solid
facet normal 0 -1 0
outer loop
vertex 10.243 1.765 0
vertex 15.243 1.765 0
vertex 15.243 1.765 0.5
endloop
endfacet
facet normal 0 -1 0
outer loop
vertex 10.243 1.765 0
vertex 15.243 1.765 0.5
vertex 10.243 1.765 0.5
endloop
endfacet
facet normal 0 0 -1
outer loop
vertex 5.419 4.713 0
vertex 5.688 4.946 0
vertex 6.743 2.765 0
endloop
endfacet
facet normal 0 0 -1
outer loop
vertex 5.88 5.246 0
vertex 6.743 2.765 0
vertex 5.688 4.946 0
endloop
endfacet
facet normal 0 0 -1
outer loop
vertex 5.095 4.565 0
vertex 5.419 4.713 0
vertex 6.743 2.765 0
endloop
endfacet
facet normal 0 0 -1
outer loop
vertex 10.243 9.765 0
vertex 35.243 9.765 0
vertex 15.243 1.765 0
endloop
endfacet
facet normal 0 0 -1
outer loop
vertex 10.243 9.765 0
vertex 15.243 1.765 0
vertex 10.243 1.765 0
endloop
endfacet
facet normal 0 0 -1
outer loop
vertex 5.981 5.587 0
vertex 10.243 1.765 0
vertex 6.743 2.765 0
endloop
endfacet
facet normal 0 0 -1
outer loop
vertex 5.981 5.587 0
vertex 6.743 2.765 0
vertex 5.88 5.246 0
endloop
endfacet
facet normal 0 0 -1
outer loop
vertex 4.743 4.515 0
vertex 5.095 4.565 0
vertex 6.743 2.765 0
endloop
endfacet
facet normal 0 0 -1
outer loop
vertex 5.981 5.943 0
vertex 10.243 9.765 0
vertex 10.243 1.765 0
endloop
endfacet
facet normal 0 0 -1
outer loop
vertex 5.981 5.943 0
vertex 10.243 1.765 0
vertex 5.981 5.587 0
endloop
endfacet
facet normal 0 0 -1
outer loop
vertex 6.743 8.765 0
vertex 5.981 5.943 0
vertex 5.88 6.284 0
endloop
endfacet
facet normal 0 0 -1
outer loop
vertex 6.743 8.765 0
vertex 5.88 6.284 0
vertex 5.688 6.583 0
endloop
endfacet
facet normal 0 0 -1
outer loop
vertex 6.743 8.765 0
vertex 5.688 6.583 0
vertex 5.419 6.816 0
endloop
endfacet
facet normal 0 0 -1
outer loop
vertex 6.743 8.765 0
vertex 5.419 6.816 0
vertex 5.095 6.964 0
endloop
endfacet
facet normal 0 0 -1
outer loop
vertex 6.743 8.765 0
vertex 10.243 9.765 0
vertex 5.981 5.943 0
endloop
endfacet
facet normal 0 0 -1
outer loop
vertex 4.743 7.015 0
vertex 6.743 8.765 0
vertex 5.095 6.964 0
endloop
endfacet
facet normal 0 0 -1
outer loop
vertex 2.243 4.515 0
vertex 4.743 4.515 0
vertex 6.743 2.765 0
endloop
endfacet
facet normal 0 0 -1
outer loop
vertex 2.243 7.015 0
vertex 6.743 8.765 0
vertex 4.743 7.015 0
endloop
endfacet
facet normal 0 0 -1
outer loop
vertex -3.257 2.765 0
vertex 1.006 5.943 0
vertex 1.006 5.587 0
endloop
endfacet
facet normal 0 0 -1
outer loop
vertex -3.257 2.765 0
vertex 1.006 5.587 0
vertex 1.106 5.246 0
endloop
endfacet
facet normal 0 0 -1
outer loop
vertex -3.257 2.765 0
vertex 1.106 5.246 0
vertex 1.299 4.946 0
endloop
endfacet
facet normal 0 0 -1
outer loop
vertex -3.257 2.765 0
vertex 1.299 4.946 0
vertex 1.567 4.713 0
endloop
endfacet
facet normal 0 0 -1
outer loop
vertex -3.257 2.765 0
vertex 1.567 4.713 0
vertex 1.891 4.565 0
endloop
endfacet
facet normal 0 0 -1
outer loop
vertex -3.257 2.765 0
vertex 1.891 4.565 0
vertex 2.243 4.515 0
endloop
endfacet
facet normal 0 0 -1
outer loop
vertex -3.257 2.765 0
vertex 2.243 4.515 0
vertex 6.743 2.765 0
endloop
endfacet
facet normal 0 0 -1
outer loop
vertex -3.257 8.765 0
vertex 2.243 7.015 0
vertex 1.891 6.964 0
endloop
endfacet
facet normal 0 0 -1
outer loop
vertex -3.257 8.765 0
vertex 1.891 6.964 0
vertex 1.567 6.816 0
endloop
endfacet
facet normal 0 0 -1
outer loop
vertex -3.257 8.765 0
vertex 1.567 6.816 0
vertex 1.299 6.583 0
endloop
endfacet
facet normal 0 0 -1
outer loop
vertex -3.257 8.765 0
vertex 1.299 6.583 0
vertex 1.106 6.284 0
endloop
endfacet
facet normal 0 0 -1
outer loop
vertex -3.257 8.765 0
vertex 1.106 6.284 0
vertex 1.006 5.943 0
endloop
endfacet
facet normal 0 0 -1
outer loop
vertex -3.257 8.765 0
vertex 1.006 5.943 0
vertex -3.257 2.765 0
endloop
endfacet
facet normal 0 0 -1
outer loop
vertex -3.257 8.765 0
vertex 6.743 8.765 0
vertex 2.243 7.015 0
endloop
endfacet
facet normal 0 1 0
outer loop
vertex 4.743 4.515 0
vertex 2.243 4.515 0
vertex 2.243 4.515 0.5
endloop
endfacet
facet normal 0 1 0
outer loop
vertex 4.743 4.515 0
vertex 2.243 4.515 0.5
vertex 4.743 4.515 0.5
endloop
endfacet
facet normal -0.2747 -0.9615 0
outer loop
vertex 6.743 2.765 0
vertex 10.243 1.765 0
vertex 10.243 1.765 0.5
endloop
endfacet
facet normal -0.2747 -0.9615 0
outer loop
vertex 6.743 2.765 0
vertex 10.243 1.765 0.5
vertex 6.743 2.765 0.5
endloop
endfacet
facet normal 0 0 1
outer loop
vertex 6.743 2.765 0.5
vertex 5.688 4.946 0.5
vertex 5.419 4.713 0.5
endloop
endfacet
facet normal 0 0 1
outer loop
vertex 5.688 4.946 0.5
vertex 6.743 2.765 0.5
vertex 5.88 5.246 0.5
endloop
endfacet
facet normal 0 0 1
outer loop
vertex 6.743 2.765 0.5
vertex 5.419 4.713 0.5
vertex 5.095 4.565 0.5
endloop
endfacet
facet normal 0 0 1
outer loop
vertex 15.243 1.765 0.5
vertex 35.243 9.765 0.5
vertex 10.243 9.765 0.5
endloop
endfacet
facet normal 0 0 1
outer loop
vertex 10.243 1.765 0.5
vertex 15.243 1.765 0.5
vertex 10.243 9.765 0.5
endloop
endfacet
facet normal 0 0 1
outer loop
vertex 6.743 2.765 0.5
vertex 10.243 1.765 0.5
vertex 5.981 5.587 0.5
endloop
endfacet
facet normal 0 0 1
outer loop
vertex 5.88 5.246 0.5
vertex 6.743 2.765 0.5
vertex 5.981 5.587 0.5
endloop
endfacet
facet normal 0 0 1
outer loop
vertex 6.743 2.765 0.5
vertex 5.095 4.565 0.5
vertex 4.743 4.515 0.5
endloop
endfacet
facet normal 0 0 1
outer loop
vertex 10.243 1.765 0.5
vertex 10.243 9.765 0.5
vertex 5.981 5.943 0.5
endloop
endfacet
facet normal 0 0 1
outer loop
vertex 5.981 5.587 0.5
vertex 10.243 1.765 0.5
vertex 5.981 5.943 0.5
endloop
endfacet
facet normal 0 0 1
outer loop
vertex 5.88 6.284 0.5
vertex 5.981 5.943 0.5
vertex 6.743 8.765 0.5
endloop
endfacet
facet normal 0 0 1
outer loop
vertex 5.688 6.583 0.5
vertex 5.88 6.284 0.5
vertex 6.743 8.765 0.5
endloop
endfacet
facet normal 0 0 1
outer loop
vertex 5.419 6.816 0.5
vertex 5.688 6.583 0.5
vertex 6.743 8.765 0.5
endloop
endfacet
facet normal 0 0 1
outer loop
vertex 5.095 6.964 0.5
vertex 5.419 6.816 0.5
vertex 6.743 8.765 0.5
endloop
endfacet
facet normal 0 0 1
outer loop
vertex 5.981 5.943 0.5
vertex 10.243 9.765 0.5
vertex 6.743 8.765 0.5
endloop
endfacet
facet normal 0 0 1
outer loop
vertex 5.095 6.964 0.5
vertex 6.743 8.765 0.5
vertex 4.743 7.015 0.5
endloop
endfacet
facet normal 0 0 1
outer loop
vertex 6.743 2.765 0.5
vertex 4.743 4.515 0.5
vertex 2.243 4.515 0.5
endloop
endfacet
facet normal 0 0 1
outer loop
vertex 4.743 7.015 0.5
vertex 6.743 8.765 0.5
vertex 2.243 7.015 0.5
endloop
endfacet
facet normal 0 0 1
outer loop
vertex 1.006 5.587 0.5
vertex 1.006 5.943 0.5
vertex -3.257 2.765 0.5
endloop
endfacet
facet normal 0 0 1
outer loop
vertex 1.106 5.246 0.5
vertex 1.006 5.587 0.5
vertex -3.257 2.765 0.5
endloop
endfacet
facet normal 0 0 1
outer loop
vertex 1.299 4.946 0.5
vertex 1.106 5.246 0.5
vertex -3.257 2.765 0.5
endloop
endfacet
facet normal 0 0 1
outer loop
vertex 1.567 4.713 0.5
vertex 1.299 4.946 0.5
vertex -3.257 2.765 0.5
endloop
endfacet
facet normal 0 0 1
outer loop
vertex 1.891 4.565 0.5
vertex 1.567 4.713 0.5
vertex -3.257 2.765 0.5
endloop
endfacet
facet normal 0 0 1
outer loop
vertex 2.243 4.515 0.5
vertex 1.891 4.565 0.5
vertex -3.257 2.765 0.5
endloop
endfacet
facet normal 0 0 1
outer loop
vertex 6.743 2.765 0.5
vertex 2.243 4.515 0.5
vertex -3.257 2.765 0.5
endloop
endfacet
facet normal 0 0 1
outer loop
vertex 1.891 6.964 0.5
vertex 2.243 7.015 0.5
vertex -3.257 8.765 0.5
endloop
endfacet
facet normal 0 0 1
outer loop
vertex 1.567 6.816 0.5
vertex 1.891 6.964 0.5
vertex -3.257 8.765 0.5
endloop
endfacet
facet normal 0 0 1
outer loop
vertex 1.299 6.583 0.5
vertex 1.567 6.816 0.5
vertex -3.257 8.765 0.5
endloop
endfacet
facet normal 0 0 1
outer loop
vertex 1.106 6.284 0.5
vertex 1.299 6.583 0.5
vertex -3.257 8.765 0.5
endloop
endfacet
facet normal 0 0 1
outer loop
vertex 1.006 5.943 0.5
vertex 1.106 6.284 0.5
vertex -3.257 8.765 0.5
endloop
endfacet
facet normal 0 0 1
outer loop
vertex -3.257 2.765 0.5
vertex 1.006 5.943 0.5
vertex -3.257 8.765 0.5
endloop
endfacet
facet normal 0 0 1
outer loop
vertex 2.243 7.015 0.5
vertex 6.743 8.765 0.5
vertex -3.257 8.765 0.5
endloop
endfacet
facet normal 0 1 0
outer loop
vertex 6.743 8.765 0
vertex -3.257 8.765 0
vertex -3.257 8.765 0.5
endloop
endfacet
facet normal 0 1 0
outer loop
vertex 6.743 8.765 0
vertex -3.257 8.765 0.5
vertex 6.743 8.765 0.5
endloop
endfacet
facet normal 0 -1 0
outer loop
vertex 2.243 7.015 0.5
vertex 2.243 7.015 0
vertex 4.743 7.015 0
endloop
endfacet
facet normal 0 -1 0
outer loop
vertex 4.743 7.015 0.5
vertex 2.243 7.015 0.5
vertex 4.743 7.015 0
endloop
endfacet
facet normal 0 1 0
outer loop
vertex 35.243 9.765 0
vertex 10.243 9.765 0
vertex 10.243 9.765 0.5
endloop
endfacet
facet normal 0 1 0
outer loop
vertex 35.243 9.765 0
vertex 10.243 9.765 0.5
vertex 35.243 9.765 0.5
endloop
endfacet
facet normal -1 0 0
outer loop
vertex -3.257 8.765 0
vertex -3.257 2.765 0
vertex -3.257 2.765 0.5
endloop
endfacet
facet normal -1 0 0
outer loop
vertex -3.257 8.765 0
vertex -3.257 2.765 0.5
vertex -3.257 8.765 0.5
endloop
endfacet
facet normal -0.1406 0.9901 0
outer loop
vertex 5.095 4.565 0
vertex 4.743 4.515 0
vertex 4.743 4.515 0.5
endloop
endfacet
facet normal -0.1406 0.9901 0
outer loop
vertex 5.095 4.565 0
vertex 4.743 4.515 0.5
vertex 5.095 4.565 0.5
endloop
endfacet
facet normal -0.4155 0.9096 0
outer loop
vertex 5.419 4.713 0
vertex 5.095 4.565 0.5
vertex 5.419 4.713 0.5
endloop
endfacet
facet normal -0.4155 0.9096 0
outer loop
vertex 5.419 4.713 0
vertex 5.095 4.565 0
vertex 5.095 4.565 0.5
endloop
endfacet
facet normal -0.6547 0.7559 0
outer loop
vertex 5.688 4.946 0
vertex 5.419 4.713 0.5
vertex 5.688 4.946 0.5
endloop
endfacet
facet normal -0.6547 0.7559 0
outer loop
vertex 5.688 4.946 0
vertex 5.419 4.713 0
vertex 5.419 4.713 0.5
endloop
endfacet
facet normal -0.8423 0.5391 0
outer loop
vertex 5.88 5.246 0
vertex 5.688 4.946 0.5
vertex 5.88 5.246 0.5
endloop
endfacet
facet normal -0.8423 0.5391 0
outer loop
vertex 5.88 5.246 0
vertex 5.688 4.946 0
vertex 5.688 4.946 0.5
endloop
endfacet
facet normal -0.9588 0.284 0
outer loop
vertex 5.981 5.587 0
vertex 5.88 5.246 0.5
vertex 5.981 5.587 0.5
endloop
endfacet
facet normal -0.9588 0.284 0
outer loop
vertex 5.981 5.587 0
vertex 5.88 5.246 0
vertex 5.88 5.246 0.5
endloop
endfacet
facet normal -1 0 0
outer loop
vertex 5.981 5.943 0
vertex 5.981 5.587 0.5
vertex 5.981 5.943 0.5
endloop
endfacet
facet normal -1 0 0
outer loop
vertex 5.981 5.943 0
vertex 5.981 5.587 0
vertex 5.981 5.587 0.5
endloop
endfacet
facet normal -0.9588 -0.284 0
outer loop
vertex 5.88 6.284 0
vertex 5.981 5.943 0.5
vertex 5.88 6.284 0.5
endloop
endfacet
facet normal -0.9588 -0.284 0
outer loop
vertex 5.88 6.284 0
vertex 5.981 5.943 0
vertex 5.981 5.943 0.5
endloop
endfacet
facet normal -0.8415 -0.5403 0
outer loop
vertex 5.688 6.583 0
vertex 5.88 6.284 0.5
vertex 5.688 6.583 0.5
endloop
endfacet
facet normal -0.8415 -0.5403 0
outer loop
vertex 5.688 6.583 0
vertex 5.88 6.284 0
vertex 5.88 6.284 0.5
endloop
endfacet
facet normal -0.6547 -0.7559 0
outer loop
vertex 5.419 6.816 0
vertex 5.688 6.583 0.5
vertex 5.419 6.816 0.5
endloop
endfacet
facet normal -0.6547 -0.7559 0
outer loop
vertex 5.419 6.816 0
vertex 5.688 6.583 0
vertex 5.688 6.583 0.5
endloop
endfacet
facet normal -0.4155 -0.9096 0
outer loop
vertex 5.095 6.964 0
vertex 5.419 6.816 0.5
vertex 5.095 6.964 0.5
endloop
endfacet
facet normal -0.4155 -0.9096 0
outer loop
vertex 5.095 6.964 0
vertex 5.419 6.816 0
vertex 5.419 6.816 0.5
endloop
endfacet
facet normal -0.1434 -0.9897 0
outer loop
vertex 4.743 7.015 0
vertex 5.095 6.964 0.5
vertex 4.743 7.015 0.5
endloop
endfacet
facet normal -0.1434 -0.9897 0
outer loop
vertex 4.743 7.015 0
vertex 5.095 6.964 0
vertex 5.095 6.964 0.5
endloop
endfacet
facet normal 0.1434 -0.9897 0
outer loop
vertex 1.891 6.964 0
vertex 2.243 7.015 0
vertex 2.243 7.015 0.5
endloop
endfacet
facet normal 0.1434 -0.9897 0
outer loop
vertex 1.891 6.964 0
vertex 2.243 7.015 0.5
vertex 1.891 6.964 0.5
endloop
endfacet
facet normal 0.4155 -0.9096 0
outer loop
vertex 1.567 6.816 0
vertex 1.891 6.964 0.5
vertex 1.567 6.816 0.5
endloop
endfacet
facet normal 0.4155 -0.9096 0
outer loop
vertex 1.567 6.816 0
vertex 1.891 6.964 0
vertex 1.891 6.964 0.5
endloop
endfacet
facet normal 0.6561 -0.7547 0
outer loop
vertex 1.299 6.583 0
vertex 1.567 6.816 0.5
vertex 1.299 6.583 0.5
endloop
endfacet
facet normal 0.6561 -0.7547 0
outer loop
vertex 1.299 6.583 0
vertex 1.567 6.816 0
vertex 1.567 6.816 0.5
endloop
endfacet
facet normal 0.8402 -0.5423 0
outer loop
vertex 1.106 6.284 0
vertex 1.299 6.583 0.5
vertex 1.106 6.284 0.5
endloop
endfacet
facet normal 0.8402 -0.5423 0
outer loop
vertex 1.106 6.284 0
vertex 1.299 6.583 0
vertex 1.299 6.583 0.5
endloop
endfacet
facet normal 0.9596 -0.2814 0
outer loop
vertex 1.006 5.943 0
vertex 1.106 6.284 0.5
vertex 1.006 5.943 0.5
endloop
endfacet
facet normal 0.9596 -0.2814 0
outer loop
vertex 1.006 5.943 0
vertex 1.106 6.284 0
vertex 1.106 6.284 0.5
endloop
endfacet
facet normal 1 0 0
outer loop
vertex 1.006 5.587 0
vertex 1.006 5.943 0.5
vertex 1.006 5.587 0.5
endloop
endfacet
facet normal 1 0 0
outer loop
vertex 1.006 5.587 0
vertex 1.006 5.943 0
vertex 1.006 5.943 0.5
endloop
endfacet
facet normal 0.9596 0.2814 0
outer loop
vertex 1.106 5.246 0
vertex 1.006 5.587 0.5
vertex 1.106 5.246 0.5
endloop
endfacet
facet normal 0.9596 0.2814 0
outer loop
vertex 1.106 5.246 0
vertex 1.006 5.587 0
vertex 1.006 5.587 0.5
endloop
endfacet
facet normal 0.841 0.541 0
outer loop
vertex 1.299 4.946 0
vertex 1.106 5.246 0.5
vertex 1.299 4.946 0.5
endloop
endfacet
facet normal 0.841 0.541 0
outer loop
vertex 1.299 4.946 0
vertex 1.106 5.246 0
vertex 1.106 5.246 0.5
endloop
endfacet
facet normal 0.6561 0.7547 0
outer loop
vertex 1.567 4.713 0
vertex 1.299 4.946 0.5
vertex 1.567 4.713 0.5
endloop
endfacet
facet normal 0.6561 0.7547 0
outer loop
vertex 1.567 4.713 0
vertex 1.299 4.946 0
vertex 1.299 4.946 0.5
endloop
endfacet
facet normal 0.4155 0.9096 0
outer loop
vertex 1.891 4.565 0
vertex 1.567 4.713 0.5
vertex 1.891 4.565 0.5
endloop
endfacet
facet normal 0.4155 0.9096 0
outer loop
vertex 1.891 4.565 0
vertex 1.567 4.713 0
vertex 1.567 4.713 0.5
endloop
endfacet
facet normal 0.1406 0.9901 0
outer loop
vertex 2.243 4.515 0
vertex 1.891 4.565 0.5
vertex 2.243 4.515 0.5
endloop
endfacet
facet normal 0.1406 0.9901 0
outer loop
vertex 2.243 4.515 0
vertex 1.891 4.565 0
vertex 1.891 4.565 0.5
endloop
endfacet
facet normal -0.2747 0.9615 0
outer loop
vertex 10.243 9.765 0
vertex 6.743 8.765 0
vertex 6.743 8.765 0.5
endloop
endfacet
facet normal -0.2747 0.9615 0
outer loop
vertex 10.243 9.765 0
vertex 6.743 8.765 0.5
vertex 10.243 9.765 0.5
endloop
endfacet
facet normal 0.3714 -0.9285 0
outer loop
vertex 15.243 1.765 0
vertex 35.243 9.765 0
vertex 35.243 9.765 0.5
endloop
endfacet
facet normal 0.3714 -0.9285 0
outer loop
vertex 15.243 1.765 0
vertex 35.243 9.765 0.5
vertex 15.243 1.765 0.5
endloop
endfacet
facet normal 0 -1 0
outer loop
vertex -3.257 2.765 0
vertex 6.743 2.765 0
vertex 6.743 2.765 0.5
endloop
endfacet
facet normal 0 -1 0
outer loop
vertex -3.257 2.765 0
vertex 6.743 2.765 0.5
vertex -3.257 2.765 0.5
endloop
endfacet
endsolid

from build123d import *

# Parameters (mm, degrees)
PAD_DEPTH = 0.5


with BuildPart() as part:
    # Sketch → Pad (new body)
    with BuildSketch(Plane.XY):
        Polygon((-3.256772, 2.764826), (-3.256772, 8.764826), (6.743228, 8.764826), (10.243228, 9.764826), (35.243228, 9.764826), (15.243228, 1.764826), (10.243228, 1.764826), (6.743228, 2.764826), align=None)
        with BuildLine():
            ThreePointArc((2.243228, 7.014826), (0.993228, 5.764826), (2.243228, 4.514826))
            Line((2.243228, 4.514826), (4.743228, 4.514826))
            ThreePointArc((4.743228, 4.514826), (5.993228, 5.764826), (4.743228, 7.014826))
            Line((2.243228, 7.014826), (4.743228, 7.014826))
        make_face(mode=Mode.SUBTRACT)
    extrude(amount=PAD_DEPTH)


solid = part.part
